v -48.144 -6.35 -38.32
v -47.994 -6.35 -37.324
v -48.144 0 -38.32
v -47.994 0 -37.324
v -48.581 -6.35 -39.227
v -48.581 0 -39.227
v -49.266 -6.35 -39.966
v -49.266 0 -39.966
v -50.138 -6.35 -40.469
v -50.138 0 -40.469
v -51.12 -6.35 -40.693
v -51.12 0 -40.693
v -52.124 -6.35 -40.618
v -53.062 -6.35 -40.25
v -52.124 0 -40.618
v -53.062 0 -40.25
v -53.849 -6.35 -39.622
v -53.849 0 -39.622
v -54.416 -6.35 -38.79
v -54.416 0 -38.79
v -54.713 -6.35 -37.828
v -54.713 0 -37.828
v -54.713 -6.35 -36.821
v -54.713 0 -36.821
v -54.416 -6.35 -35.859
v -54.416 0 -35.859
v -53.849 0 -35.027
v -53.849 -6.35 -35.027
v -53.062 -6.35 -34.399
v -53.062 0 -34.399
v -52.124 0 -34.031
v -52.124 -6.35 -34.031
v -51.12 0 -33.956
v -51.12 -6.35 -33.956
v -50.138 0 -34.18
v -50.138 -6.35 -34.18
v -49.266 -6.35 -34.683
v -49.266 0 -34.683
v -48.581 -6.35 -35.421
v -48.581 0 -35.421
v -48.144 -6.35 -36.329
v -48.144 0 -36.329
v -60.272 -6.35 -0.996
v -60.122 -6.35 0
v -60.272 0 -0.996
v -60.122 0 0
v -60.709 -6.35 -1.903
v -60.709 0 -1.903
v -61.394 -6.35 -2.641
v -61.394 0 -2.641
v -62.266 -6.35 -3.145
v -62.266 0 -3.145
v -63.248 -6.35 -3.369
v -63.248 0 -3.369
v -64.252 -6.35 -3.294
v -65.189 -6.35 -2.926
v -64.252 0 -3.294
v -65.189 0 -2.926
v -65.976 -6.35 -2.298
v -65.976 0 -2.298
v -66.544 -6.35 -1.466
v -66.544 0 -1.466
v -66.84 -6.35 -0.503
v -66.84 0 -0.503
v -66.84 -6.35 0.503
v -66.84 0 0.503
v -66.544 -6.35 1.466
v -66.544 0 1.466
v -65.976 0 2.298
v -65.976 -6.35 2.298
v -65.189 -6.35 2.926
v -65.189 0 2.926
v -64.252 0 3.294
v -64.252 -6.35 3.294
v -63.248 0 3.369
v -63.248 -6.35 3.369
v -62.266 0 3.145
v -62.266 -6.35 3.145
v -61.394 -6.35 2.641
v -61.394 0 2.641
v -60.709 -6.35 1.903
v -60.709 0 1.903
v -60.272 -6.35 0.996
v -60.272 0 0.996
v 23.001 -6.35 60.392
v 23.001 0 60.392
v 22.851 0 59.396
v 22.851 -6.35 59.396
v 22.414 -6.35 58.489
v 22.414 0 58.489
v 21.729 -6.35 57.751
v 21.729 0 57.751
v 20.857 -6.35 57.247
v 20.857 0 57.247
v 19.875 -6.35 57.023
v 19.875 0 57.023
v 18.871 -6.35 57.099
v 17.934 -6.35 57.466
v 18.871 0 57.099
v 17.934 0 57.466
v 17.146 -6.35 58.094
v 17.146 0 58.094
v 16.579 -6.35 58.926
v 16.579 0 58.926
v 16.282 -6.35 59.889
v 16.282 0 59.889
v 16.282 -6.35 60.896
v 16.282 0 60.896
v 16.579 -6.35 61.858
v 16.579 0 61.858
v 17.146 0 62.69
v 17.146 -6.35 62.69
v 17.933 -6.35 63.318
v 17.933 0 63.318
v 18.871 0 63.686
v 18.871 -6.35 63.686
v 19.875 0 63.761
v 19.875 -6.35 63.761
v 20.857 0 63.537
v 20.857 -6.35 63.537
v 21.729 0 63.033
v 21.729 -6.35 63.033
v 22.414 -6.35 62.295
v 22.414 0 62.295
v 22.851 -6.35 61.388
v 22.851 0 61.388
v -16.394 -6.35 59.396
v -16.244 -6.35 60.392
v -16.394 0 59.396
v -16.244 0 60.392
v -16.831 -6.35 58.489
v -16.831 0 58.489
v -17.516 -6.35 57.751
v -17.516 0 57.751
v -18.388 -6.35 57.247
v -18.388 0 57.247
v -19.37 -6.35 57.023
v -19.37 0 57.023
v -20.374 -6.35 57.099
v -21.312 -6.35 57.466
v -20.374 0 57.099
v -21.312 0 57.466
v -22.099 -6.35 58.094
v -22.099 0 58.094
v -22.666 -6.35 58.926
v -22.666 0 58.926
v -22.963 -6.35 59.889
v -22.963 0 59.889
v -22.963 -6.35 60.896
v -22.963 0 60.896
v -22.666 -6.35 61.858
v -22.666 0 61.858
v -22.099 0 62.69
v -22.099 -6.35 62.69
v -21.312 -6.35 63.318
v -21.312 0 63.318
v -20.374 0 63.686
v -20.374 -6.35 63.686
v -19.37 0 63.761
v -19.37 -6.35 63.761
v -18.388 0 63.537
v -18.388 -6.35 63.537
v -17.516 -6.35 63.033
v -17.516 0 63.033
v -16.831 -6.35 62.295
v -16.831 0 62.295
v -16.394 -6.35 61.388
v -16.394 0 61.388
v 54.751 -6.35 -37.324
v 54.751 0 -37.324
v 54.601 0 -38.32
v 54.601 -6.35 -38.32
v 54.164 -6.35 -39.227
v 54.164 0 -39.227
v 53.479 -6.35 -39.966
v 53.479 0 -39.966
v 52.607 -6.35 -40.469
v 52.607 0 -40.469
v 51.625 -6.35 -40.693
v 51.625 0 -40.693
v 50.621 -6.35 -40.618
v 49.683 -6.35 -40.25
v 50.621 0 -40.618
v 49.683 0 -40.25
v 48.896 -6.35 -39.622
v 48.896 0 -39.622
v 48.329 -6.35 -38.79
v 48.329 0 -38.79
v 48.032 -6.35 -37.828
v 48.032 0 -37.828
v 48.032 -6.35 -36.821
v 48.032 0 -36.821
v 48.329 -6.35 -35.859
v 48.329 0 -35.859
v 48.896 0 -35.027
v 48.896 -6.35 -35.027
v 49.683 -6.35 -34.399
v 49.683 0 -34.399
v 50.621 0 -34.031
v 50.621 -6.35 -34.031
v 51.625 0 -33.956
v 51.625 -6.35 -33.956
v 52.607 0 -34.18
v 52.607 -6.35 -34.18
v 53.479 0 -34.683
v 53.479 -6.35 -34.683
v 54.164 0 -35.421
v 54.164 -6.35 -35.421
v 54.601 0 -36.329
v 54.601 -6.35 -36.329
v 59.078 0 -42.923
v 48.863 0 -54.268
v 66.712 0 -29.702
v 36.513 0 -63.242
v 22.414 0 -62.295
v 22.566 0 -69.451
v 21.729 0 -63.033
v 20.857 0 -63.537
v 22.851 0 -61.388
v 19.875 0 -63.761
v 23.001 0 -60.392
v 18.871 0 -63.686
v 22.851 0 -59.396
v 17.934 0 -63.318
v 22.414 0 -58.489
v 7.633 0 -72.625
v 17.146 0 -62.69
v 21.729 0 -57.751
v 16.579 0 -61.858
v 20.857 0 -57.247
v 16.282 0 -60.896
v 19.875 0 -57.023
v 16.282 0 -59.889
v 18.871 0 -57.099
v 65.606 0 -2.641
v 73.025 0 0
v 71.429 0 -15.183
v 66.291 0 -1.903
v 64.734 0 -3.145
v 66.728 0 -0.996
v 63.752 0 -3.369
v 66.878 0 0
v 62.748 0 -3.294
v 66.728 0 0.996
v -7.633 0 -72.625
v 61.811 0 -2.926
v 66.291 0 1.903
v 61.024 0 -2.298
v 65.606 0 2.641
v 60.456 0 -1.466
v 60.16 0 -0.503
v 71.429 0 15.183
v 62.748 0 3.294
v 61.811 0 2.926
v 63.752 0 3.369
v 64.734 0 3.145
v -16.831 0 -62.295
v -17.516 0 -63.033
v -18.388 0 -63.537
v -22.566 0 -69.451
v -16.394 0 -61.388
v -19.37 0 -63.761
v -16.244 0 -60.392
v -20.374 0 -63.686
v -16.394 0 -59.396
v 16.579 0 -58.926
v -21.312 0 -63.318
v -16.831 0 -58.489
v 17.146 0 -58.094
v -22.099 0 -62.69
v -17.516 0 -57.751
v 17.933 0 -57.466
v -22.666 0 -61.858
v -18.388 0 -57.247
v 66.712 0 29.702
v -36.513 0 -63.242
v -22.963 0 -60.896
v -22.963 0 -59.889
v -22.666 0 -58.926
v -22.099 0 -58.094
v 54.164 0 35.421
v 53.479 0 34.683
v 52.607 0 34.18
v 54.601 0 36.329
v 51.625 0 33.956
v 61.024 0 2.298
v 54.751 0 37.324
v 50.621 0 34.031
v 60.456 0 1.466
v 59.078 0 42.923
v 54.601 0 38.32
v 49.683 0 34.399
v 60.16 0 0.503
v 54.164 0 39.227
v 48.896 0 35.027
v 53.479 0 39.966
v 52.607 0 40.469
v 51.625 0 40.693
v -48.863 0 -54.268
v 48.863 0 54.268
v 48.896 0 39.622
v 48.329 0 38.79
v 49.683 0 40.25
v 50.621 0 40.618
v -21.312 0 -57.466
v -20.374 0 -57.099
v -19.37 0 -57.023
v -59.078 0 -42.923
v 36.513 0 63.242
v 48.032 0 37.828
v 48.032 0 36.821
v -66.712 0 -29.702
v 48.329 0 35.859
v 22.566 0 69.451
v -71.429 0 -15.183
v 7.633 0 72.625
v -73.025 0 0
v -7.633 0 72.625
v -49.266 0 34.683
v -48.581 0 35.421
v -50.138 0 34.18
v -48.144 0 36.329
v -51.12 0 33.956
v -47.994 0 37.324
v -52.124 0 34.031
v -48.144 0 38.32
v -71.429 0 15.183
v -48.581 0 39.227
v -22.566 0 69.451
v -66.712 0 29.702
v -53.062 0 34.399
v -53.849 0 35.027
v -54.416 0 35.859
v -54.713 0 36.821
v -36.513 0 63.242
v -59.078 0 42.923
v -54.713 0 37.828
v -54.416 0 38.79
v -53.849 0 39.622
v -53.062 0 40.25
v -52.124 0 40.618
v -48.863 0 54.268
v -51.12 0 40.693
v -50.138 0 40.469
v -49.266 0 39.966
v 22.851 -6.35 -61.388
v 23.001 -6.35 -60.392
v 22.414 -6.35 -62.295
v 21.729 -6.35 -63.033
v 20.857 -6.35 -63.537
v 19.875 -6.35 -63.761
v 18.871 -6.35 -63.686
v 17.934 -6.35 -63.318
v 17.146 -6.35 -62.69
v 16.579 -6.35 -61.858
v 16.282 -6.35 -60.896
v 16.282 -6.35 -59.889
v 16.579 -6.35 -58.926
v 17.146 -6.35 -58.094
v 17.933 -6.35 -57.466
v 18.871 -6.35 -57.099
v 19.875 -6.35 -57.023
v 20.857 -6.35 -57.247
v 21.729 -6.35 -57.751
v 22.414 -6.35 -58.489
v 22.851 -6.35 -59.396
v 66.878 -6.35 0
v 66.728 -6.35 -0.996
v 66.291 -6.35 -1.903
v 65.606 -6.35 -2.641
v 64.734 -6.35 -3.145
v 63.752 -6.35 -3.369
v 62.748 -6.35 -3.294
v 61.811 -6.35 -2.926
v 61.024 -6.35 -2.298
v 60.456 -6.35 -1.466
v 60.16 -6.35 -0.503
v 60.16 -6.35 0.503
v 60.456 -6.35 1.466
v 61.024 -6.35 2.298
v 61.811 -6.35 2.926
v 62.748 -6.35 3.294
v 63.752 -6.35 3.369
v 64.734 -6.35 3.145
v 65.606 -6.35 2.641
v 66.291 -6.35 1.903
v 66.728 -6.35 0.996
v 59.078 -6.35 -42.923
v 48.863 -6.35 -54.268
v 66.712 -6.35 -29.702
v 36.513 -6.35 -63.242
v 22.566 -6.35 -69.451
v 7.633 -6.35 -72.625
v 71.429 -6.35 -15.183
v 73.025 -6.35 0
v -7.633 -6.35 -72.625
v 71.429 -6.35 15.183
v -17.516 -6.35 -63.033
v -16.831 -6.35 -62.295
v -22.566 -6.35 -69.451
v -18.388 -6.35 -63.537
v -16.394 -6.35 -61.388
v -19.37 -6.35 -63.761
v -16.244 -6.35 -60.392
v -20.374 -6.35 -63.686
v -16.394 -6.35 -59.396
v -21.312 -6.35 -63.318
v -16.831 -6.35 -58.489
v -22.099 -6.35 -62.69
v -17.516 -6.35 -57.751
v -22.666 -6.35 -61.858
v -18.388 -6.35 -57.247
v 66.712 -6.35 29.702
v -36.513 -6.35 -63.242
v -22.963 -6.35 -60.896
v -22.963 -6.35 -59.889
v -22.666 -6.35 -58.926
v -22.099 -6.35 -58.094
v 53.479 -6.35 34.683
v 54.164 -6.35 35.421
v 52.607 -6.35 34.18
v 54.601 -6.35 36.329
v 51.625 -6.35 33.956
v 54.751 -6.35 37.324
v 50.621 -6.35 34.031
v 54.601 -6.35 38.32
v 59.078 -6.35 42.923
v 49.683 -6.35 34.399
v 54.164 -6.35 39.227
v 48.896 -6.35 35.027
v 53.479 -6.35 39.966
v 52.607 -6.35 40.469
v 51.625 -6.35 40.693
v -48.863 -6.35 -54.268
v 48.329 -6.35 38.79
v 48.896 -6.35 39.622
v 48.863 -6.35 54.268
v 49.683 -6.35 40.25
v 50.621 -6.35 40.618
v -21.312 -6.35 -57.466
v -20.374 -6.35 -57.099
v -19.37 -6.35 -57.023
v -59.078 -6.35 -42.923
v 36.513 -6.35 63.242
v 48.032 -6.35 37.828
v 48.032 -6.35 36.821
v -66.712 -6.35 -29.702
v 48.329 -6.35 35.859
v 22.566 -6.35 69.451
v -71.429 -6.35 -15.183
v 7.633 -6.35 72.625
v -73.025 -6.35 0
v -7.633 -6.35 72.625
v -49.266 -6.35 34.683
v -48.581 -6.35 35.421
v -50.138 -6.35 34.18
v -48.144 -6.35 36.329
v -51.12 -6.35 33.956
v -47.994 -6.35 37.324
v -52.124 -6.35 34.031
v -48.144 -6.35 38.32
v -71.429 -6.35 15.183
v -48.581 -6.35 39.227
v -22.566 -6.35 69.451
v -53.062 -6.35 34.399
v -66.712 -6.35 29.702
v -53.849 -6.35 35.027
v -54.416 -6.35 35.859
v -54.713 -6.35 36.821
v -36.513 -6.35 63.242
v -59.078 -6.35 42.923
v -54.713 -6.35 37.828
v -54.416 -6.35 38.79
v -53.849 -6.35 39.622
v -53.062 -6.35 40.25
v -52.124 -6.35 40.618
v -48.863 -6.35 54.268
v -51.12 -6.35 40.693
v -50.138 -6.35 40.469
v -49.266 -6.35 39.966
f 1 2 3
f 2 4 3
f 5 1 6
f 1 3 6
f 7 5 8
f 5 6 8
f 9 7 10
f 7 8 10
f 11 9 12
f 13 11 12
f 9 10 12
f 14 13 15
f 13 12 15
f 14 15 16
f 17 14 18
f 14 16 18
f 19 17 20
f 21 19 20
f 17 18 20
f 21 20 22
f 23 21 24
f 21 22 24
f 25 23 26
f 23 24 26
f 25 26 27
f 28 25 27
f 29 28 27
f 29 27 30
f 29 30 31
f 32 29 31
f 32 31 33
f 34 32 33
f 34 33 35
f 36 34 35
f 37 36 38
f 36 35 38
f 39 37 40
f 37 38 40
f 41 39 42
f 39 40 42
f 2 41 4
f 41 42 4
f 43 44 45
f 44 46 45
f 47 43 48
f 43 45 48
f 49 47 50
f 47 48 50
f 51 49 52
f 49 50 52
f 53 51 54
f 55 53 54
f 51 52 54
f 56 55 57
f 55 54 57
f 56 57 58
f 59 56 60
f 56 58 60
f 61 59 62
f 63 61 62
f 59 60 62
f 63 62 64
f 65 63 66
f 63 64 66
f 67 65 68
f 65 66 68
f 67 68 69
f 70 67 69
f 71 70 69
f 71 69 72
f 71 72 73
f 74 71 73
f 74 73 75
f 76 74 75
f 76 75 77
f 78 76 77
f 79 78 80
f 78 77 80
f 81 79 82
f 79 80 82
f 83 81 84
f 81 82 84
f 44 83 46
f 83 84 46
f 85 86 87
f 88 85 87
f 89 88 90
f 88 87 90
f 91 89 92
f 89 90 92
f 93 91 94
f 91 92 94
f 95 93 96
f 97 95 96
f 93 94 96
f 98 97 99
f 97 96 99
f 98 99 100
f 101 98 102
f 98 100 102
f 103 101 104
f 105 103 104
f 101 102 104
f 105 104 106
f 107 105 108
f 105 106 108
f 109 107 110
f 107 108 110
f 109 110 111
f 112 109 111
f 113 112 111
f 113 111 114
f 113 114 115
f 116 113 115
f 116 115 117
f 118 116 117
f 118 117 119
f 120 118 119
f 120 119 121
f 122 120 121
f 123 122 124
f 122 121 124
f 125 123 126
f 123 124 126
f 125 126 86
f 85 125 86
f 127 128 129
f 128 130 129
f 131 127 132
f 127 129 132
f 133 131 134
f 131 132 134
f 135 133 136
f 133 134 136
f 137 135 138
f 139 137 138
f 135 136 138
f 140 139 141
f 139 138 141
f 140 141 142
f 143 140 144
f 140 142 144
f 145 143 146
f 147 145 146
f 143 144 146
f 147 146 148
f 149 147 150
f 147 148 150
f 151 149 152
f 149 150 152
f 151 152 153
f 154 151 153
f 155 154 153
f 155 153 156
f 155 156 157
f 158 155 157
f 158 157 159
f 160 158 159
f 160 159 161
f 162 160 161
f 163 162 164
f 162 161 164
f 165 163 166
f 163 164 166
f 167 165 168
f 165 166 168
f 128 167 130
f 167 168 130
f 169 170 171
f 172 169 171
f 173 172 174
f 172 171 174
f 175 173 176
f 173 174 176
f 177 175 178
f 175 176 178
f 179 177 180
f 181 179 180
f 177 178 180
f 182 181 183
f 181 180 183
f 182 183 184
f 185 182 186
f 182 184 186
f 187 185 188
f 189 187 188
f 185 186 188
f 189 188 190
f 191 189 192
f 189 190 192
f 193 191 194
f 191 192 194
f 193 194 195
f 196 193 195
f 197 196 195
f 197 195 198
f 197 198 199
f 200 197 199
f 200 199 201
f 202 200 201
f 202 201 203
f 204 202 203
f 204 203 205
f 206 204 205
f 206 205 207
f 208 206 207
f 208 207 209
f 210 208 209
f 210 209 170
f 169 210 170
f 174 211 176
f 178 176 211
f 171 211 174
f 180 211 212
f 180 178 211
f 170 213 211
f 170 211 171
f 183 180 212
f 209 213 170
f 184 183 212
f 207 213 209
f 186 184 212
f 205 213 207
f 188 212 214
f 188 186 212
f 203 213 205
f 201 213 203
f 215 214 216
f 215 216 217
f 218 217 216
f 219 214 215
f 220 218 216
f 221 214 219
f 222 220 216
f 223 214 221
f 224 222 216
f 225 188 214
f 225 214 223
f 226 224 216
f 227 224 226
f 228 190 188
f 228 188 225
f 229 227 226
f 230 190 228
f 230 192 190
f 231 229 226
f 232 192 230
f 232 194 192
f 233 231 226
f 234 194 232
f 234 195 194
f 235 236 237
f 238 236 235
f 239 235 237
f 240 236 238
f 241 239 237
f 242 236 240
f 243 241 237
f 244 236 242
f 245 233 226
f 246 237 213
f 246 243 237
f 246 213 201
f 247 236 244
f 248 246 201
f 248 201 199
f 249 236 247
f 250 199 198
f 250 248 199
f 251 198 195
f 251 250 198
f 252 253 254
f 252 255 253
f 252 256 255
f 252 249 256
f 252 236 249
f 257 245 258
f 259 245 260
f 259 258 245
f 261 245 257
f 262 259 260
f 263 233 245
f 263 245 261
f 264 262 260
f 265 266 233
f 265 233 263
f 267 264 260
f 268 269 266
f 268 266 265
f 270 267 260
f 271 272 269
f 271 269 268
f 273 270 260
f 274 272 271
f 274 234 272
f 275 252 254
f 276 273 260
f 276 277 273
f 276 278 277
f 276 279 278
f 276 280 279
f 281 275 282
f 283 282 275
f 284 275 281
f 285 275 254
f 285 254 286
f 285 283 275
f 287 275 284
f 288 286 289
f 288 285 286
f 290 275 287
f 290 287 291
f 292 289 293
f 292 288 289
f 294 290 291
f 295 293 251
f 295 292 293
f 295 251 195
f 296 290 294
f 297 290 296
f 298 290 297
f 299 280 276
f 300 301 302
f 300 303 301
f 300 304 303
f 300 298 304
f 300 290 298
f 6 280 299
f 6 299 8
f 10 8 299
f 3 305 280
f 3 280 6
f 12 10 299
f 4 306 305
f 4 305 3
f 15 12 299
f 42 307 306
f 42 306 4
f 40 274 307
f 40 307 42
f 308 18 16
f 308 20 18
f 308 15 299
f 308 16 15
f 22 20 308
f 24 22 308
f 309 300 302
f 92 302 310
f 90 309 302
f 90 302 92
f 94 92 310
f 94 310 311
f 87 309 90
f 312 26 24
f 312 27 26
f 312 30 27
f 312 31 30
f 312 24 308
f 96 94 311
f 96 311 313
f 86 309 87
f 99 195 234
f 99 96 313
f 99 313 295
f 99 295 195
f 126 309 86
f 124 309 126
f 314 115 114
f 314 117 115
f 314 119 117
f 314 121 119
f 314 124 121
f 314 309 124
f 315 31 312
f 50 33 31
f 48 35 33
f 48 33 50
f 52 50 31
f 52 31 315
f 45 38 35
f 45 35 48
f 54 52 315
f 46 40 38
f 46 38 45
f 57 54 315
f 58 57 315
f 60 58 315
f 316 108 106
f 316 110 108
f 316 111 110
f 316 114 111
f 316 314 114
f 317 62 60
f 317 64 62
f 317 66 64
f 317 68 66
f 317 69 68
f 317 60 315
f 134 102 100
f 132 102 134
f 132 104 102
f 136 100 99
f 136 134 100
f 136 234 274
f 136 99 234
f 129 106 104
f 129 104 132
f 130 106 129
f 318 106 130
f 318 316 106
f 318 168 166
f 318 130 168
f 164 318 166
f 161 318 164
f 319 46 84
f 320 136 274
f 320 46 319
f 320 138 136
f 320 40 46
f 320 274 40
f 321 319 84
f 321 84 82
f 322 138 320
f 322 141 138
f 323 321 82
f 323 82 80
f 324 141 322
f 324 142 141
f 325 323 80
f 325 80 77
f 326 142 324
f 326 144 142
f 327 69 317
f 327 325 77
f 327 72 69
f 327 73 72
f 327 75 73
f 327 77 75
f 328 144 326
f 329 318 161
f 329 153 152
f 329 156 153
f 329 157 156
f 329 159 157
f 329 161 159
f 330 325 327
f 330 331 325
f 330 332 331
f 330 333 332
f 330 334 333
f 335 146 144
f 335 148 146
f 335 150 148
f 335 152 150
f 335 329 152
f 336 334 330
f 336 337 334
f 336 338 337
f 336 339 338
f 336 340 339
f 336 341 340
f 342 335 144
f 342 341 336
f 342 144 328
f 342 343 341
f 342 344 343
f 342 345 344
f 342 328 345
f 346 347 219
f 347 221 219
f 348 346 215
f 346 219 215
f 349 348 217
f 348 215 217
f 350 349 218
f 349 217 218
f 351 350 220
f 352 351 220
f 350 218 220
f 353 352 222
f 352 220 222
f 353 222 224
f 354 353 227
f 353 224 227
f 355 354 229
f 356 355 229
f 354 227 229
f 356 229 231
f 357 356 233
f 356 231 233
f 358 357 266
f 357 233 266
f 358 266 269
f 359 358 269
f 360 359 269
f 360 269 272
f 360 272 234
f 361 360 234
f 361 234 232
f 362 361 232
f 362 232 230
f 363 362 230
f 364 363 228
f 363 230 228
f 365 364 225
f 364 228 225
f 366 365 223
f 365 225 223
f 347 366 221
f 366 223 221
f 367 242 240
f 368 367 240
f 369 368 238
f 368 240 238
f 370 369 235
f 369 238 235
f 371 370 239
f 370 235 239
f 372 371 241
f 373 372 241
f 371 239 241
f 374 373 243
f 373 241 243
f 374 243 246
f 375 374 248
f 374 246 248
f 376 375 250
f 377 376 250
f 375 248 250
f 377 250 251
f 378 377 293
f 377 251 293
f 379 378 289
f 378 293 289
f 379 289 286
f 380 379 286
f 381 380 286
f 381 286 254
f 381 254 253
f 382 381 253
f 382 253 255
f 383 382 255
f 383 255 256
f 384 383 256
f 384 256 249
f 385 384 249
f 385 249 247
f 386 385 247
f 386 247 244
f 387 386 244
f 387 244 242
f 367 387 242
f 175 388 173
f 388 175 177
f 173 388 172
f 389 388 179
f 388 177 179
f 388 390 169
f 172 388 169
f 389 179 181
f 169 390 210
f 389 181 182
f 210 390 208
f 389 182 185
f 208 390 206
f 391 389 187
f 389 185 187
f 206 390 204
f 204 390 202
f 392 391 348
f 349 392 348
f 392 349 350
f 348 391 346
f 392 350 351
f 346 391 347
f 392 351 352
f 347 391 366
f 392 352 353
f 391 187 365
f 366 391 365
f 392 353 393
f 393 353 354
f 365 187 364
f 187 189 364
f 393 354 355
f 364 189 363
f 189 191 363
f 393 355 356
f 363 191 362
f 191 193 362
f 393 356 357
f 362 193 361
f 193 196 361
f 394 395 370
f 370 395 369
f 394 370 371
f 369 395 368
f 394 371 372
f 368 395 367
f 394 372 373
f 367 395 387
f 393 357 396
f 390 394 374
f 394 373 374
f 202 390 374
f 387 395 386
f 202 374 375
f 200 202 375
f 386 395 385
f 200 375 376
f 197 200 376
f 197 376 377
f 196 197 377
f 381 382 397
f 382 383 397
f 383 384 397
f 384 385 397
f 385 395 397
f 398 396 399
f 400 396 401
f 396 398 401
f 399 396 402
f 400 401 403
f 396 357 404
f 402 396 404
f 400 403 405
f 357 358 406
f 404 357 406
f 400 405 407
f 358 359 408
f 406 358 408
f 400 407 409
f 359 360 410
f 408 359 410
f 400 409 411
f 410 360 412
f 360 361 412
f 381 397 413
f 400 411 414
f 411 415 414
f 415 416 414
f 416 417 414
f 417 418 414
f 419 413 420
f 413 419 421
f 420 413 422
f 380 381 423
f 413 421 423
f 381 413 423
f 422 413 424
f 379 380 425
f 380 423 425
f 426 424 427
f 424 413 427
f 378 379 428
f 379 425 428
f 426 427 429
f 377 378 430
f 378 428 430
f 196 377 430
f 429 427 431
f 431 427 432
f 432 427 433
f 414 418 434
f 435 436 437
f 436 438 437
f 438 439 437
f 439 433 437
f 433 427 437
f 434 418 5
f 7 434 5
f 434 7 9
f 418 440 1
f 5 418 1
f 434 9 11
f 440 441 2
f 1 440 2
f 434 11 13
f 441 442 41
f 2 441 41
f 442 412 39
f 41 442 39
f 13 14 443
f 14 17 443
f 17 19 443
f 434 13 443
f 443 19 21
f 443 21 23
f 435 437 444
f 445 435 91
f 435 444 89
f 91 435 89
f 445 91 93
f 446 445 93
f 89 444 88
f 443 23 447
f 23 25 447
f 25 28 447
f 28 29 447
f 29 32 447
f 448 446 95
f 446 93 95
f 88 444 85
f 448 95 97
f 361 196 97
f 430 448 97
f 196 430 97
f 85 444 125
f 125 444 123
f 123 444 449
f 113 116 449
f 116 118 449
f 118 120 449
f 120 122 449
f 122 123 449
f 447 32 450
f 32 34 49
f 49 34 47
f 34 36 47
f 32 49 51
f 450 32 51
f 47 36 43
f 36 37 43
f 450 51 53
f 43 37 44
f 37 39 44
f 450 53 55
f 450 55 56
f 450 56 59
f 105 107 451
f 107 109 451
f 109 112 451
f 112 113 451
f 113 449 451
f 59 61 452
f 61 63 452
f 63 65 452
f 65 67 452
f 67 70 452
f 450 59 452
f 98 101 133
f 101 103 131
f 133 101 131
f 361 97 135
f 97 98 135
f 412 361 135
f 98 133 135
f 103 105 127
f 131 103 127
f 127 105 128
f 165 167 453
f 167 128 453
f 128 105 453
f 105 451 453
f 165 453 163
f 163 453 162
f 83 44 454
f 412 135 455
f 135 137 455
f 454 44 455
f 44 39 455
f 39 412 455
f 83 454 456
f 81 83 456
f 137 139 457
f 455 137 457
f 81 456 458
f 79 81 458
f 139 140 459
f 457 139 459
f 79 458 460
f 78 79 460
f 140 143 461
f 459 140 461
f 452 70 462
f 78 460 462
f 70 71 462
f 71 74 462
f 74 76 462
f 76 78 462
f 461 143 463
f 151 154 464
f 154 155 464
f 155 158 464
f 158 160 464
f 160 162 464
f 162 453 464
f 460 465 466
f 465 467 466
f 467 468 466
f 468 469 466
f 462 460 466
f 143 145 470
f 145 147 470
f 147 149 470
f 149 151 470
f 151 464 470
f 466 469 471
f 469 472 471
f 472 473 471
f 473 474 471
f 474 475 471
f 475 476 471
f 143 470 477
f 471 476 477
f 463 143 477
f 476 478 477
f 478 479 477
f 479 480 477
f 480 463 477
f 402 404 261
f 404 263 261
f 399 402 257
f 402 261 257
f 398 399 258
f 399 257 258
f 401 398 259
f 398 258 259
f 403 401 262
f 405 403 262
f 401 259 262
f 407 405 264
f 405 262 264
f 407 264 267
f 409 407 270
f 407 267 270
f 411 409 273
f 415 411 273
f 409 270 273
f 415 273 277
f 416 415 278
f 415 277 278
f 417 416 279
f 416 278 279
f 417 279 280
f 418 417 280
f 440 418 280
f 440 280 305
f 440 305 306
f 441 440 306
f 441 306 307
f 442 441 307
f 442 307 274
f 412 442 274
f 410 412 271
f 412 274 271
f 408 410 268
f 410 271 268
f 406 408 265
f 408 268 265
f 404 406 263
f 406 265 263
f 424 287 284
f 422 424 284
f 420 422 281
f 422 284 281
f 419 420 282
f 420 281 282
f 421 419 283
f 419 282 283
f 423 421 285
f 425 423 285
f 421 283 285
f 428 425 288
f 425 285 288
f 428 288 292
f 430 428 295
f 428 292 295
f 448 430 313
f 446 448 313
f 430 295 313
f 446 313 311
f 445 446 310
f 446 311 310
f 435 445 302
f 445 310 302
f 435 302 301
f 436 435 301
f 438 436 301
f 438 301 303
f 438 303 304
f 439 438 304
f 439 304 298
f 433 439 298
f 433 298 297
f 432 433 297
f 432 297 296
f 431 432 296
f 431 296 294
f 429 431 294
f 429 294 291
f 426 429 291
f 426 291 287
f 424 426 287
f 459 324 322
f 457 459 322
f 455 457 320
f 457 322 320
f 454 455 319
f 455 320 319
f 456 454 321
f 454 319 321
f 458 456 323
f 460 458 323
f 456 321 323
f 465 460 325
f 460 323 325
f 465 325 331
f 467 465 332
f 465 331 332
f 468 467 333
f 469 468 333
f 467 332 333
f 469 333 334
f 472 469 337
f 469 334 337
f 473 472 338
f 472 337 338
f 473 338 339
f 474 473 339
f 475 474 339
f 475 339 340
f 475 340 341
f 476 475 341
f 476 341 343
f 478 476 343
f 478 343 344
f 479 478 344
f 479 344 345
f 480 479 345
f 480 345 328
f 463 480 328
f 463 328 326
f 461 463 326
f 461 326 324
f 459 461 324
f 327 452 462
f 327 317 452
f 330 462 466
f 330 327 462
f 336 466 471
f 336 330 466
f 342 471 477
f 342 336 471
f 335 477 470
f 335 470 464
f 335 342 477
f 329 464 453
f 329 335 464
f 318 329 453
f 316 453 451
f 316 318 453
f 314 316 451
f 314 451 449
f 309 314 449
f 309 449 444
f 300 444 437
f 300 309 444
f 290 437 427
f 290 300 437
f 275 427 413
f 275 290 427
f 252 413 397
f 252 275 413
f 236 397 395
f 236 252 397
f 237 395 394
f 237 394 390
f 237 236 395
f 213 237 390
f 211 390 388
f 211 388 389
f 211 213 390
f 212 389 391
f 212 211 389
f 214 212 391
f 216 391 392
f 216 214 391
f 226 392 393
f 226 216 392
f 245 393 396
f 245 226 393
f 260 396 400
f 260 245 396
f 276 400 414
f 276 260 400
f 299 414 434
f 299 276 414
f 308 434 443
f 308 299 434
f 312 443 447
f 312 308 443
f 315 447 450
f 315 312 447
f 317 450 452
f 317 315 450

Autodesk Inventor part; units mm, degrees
ref_plane "YZ Plane" through (0, 0, 0) normal (1, 0, 0) x (0, 1, 0)
ref_plane "XZ Plane" through (0, 0, 0) normal (0, 1, 0) x (-1, 0, 0)
ref_plane "XY Plane" through (0, 0, 0) normal (0, 0, 1) x (1, 0, 0)
sketch "Sketch1" plane through (0, 0, 0) normal (0, 1, 0) x (-1, 0, 0)
  circle A0 centre (0, 0) radius 73.025
  dimension "d4" = 146.05
extrude "Extrusion1" add sketch "Sketch1" against normal blind 6.35
sketch "Sketch5" plane through (0, 0, 0) normal (0, 1, 0) x (1, 0, 0)
  circle A0 centre (0, 0) radius 63.5 construction
  circle A1 centre (-63.5, 0) radius 3.3782
  circle A2 centre (-51.3726, -37.3244) radius 3.3782
  circle A3 centre (-19.6226, -60.3921) radius 3.3782
  circle A4 centre (19.6226, -60.3921) radius 3.3782
  circle A5 centre (51.3726, -37.3244) radius 3.3782
  circle A6 centre (63.5, 0) radius 3.3782
  circle A7 centre (51.3726, 37.3244) radius 3.3782
  circle A8 centre (19.6226, 60.3921) radius 3.3782
  circle A9 centre (-19.6226, 60.3921) radius 3.3782
  circle A10 centre (-51.3726, 37.3244) radius 3.3782
  dimension "d17" = 127
  dimension "d18" = 6.7564
  dimension "d21" = 360
extrude "Extrusion4" cut sketch "Sketch5" against normal through all
properties part number "SupportPlateForWater" material "PET Plastic"
